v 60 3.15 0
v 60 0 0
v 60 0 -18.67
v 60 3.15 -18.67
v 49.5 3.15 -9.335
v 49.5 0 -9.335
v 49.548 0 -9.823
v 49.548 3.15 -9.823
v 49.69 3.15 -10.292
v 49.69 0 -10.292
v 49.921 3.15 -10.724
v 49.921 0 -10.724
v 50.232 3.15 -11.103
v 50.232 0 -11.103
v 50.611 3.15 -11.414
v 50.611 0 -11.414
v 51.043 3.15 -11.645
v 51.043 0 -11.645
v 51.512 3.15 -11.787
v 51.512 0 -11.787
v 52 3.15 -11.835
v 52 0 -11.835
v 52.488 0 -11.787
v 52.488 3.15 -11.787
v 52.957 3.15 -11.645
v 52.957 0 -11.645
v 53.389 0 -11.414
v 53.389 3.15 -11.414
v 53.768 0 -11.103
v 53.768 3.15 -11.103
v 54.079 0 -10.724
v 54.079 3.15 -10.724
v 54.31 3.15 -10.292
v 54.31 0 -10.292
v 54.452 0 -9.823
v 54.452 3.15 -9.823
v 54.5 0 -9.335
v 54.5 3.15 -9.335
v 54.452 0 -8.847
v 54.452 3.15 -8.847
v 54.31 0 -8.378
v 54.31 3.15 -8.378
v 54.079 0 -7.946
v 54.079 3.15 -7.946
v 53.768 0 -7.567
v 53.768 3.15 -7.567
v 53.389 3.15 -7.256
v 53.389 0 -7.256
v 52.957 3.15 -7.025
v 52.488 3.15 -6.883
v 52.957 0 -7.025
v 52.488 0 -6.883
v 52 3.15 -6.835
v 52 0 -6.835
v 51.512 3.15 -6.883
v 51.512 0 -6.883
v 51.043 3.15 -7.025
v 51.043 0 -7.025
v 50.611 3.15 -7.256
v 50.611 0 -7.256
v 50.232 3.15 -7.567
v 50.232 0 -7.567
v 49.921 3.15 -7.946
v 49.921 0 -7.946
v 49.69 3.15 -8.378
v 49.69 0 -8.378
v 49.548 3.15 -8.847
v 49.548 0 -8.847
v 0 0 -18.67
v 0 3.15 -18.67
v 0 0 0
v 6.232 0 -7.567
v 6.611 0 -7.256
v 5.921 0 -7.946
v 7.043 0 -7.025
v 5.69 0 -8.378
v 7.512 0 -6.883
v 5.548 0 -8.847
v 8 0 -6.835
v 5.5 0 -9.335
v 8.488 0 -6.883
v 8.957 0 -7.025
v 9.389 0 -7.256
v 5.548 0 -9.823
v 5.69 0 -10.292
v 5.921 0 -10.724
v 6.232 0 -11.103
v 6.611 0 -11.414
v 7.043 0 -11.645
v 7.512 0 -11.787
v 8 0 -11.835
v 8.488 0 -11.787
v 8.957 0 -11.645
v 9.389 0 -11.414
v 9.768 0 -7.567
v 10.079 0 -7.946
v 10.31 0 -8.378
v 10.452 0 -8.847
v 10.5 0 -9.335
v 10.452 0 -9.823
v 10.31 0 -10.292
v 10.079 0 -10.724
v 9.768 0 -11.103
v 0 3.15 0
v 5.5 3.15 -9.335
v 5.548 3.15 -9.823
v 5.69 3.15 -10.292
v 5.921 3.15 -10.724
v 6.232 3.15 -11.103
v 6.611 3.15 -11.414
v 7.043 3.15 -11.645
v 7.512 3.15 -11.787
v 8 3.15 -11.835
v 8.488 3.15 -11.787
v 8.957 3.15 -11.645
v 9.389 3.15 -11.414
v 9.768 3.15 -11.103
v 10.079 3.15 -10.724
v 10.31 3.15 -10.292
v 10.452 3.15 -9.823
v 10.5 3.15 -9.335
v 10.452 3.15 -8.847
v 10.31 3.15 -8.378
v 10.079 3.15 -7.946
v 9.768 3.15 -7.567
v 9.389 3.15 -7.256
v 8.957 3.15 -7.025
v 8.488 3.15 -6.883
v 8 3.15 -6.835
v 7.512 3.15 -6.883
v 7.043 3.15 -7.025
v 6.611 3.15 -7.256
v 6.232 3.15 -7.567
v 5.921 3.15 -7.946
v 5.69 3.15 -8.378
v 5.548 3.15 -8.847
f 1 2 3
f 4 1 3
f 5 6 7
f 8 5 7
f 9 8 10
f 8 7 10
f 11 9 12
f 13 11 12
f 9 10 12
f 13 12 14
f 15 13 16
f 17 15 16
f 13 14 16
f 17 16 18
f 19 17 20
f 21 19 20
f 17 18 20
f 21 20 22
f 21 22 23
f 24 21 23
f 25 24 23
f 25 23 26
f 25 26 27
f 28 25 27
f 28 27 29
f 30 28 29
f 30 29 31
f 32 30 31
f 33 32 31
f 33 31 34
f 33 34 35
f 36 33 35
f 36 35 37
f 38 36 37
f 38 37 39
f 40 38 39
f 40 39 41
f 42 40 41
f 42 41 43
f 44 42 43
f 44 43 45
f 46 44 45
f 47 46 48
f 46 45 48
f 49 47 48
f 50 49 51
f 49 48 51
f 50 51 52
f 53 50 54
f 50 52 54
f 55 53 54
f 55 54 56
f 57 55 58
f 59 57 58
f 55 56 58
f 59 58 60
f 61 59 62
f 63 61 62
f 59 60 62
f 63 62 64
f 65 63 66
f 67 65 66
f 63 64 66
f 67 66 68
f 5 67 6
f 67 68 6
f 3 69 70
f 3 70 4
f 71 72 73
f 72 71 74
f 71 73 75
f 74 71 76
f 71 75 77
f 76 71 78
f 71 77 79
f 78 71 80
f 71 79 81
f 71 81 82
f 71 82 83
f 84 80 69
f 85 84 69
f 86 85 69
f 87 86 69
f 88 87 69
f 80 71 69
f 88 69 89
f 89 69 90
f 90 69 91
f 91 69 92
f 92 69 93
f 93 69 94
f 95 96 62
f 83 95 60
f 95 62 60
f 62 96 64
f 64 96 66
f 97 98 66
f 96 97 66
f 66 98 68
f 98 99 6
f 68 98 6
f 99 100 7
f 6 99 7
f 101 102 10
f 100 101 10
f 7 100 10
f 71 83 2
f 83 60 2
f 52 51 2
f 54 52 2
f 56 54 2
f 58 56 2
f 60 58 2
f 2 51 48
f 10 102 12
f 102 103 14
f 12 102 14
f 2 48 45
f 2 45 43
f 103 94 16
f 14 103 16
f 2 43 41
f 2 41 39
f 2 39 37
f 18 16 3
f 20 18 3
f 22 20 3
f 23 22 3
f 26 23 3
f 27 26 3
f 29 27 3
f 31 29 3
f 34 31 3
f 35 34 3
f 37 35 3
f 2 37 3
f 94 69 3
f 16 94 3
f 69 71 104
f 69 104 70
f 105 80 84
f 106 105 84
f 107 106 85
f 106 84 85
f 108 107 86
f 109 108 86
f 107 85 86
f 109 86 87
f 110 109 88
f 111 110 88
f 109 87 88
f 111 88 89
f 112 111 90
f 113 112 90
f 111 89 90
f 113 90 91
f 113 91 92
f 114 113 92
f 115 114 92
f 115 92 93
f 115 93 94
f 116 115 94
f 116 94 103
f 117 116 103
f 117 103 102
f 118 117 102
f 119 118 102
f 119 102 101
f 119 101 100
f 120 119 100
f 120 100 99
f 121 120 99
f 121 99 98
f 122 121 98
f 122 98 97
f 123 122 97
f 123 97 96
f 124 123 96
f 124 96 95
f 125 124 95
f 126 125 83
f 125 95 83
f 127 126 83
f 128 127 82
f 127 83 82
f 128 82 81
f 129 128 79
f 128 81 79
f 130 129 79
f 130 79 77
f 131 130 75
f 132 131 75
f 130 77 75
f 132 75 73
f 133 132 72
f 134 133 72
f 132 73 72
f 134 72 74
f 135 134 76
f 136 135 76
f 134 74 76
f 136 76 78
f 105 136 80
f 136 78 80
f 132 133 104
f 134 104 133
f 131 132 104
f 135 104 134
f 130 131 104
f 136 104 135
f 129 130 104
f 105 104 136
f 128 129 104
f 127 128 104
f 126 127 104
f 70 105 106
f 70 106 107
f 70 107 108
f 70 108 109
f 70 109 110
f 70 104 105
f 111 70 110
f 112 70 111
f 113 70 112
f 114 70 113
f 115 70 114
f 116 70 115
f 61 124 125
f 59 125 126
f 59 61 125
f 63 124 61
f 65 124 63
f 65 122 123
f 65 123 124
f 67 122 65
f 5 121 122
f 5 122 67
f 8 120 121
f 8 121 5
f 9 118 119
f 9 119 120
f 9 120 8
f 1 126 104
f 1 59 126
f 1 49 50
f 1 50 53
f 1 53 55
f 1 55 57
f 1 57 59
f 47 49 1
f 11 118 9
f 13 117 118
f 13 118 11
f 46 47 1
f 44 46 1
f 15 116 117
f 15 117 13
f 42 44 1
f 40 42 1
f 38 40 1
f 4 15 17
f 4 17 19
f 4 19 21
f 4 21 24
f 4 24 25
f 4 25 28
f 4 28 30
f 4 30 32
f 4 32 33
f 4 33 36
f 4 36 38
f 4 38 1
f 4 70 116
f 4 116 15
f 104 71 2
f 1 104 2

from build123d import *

# Parameters (mm, degrees)
SKETCH1_W                 = 60
SKETCH1_H                 = 18.67
BOSS_EXTRUDE1_DEPTH       = 3.15
F_5_0MM_DOWEL_HOLE1_D     = 5
F_5_0MM_DOWEL_HOLE1_DEPTH = 3.15


with BuildPart() as part:
    # Sketch1 → Boss-Extrude1 (new body)
    with BuildSketch(Plane(origin=(0, 0, 0), x_dir=(1, 0, 0), z_dir=(0, 1, 0))):
        with Locations((30, 9.335)):
            Rectangle(SKETCH1_W, SKETCH1_H)
    extrude(amount=BOSS_EXTRUDE1_DEPTH)

    # Ø5.0mm Dowel Hole1
    with Locations(Plane(origin=(0, 3.15, 0), x_dir=(1, 0, 0), z_dir=(0, 1, 0))):
        with Locations((8, 9.335), (52, 9.335)):
            Hole(F_5_0MM_DOWEL_HOLE1_D / 2, depth=F_5_0MM_DOWEL_HOLE1_DEPTH)


solid = part.part
